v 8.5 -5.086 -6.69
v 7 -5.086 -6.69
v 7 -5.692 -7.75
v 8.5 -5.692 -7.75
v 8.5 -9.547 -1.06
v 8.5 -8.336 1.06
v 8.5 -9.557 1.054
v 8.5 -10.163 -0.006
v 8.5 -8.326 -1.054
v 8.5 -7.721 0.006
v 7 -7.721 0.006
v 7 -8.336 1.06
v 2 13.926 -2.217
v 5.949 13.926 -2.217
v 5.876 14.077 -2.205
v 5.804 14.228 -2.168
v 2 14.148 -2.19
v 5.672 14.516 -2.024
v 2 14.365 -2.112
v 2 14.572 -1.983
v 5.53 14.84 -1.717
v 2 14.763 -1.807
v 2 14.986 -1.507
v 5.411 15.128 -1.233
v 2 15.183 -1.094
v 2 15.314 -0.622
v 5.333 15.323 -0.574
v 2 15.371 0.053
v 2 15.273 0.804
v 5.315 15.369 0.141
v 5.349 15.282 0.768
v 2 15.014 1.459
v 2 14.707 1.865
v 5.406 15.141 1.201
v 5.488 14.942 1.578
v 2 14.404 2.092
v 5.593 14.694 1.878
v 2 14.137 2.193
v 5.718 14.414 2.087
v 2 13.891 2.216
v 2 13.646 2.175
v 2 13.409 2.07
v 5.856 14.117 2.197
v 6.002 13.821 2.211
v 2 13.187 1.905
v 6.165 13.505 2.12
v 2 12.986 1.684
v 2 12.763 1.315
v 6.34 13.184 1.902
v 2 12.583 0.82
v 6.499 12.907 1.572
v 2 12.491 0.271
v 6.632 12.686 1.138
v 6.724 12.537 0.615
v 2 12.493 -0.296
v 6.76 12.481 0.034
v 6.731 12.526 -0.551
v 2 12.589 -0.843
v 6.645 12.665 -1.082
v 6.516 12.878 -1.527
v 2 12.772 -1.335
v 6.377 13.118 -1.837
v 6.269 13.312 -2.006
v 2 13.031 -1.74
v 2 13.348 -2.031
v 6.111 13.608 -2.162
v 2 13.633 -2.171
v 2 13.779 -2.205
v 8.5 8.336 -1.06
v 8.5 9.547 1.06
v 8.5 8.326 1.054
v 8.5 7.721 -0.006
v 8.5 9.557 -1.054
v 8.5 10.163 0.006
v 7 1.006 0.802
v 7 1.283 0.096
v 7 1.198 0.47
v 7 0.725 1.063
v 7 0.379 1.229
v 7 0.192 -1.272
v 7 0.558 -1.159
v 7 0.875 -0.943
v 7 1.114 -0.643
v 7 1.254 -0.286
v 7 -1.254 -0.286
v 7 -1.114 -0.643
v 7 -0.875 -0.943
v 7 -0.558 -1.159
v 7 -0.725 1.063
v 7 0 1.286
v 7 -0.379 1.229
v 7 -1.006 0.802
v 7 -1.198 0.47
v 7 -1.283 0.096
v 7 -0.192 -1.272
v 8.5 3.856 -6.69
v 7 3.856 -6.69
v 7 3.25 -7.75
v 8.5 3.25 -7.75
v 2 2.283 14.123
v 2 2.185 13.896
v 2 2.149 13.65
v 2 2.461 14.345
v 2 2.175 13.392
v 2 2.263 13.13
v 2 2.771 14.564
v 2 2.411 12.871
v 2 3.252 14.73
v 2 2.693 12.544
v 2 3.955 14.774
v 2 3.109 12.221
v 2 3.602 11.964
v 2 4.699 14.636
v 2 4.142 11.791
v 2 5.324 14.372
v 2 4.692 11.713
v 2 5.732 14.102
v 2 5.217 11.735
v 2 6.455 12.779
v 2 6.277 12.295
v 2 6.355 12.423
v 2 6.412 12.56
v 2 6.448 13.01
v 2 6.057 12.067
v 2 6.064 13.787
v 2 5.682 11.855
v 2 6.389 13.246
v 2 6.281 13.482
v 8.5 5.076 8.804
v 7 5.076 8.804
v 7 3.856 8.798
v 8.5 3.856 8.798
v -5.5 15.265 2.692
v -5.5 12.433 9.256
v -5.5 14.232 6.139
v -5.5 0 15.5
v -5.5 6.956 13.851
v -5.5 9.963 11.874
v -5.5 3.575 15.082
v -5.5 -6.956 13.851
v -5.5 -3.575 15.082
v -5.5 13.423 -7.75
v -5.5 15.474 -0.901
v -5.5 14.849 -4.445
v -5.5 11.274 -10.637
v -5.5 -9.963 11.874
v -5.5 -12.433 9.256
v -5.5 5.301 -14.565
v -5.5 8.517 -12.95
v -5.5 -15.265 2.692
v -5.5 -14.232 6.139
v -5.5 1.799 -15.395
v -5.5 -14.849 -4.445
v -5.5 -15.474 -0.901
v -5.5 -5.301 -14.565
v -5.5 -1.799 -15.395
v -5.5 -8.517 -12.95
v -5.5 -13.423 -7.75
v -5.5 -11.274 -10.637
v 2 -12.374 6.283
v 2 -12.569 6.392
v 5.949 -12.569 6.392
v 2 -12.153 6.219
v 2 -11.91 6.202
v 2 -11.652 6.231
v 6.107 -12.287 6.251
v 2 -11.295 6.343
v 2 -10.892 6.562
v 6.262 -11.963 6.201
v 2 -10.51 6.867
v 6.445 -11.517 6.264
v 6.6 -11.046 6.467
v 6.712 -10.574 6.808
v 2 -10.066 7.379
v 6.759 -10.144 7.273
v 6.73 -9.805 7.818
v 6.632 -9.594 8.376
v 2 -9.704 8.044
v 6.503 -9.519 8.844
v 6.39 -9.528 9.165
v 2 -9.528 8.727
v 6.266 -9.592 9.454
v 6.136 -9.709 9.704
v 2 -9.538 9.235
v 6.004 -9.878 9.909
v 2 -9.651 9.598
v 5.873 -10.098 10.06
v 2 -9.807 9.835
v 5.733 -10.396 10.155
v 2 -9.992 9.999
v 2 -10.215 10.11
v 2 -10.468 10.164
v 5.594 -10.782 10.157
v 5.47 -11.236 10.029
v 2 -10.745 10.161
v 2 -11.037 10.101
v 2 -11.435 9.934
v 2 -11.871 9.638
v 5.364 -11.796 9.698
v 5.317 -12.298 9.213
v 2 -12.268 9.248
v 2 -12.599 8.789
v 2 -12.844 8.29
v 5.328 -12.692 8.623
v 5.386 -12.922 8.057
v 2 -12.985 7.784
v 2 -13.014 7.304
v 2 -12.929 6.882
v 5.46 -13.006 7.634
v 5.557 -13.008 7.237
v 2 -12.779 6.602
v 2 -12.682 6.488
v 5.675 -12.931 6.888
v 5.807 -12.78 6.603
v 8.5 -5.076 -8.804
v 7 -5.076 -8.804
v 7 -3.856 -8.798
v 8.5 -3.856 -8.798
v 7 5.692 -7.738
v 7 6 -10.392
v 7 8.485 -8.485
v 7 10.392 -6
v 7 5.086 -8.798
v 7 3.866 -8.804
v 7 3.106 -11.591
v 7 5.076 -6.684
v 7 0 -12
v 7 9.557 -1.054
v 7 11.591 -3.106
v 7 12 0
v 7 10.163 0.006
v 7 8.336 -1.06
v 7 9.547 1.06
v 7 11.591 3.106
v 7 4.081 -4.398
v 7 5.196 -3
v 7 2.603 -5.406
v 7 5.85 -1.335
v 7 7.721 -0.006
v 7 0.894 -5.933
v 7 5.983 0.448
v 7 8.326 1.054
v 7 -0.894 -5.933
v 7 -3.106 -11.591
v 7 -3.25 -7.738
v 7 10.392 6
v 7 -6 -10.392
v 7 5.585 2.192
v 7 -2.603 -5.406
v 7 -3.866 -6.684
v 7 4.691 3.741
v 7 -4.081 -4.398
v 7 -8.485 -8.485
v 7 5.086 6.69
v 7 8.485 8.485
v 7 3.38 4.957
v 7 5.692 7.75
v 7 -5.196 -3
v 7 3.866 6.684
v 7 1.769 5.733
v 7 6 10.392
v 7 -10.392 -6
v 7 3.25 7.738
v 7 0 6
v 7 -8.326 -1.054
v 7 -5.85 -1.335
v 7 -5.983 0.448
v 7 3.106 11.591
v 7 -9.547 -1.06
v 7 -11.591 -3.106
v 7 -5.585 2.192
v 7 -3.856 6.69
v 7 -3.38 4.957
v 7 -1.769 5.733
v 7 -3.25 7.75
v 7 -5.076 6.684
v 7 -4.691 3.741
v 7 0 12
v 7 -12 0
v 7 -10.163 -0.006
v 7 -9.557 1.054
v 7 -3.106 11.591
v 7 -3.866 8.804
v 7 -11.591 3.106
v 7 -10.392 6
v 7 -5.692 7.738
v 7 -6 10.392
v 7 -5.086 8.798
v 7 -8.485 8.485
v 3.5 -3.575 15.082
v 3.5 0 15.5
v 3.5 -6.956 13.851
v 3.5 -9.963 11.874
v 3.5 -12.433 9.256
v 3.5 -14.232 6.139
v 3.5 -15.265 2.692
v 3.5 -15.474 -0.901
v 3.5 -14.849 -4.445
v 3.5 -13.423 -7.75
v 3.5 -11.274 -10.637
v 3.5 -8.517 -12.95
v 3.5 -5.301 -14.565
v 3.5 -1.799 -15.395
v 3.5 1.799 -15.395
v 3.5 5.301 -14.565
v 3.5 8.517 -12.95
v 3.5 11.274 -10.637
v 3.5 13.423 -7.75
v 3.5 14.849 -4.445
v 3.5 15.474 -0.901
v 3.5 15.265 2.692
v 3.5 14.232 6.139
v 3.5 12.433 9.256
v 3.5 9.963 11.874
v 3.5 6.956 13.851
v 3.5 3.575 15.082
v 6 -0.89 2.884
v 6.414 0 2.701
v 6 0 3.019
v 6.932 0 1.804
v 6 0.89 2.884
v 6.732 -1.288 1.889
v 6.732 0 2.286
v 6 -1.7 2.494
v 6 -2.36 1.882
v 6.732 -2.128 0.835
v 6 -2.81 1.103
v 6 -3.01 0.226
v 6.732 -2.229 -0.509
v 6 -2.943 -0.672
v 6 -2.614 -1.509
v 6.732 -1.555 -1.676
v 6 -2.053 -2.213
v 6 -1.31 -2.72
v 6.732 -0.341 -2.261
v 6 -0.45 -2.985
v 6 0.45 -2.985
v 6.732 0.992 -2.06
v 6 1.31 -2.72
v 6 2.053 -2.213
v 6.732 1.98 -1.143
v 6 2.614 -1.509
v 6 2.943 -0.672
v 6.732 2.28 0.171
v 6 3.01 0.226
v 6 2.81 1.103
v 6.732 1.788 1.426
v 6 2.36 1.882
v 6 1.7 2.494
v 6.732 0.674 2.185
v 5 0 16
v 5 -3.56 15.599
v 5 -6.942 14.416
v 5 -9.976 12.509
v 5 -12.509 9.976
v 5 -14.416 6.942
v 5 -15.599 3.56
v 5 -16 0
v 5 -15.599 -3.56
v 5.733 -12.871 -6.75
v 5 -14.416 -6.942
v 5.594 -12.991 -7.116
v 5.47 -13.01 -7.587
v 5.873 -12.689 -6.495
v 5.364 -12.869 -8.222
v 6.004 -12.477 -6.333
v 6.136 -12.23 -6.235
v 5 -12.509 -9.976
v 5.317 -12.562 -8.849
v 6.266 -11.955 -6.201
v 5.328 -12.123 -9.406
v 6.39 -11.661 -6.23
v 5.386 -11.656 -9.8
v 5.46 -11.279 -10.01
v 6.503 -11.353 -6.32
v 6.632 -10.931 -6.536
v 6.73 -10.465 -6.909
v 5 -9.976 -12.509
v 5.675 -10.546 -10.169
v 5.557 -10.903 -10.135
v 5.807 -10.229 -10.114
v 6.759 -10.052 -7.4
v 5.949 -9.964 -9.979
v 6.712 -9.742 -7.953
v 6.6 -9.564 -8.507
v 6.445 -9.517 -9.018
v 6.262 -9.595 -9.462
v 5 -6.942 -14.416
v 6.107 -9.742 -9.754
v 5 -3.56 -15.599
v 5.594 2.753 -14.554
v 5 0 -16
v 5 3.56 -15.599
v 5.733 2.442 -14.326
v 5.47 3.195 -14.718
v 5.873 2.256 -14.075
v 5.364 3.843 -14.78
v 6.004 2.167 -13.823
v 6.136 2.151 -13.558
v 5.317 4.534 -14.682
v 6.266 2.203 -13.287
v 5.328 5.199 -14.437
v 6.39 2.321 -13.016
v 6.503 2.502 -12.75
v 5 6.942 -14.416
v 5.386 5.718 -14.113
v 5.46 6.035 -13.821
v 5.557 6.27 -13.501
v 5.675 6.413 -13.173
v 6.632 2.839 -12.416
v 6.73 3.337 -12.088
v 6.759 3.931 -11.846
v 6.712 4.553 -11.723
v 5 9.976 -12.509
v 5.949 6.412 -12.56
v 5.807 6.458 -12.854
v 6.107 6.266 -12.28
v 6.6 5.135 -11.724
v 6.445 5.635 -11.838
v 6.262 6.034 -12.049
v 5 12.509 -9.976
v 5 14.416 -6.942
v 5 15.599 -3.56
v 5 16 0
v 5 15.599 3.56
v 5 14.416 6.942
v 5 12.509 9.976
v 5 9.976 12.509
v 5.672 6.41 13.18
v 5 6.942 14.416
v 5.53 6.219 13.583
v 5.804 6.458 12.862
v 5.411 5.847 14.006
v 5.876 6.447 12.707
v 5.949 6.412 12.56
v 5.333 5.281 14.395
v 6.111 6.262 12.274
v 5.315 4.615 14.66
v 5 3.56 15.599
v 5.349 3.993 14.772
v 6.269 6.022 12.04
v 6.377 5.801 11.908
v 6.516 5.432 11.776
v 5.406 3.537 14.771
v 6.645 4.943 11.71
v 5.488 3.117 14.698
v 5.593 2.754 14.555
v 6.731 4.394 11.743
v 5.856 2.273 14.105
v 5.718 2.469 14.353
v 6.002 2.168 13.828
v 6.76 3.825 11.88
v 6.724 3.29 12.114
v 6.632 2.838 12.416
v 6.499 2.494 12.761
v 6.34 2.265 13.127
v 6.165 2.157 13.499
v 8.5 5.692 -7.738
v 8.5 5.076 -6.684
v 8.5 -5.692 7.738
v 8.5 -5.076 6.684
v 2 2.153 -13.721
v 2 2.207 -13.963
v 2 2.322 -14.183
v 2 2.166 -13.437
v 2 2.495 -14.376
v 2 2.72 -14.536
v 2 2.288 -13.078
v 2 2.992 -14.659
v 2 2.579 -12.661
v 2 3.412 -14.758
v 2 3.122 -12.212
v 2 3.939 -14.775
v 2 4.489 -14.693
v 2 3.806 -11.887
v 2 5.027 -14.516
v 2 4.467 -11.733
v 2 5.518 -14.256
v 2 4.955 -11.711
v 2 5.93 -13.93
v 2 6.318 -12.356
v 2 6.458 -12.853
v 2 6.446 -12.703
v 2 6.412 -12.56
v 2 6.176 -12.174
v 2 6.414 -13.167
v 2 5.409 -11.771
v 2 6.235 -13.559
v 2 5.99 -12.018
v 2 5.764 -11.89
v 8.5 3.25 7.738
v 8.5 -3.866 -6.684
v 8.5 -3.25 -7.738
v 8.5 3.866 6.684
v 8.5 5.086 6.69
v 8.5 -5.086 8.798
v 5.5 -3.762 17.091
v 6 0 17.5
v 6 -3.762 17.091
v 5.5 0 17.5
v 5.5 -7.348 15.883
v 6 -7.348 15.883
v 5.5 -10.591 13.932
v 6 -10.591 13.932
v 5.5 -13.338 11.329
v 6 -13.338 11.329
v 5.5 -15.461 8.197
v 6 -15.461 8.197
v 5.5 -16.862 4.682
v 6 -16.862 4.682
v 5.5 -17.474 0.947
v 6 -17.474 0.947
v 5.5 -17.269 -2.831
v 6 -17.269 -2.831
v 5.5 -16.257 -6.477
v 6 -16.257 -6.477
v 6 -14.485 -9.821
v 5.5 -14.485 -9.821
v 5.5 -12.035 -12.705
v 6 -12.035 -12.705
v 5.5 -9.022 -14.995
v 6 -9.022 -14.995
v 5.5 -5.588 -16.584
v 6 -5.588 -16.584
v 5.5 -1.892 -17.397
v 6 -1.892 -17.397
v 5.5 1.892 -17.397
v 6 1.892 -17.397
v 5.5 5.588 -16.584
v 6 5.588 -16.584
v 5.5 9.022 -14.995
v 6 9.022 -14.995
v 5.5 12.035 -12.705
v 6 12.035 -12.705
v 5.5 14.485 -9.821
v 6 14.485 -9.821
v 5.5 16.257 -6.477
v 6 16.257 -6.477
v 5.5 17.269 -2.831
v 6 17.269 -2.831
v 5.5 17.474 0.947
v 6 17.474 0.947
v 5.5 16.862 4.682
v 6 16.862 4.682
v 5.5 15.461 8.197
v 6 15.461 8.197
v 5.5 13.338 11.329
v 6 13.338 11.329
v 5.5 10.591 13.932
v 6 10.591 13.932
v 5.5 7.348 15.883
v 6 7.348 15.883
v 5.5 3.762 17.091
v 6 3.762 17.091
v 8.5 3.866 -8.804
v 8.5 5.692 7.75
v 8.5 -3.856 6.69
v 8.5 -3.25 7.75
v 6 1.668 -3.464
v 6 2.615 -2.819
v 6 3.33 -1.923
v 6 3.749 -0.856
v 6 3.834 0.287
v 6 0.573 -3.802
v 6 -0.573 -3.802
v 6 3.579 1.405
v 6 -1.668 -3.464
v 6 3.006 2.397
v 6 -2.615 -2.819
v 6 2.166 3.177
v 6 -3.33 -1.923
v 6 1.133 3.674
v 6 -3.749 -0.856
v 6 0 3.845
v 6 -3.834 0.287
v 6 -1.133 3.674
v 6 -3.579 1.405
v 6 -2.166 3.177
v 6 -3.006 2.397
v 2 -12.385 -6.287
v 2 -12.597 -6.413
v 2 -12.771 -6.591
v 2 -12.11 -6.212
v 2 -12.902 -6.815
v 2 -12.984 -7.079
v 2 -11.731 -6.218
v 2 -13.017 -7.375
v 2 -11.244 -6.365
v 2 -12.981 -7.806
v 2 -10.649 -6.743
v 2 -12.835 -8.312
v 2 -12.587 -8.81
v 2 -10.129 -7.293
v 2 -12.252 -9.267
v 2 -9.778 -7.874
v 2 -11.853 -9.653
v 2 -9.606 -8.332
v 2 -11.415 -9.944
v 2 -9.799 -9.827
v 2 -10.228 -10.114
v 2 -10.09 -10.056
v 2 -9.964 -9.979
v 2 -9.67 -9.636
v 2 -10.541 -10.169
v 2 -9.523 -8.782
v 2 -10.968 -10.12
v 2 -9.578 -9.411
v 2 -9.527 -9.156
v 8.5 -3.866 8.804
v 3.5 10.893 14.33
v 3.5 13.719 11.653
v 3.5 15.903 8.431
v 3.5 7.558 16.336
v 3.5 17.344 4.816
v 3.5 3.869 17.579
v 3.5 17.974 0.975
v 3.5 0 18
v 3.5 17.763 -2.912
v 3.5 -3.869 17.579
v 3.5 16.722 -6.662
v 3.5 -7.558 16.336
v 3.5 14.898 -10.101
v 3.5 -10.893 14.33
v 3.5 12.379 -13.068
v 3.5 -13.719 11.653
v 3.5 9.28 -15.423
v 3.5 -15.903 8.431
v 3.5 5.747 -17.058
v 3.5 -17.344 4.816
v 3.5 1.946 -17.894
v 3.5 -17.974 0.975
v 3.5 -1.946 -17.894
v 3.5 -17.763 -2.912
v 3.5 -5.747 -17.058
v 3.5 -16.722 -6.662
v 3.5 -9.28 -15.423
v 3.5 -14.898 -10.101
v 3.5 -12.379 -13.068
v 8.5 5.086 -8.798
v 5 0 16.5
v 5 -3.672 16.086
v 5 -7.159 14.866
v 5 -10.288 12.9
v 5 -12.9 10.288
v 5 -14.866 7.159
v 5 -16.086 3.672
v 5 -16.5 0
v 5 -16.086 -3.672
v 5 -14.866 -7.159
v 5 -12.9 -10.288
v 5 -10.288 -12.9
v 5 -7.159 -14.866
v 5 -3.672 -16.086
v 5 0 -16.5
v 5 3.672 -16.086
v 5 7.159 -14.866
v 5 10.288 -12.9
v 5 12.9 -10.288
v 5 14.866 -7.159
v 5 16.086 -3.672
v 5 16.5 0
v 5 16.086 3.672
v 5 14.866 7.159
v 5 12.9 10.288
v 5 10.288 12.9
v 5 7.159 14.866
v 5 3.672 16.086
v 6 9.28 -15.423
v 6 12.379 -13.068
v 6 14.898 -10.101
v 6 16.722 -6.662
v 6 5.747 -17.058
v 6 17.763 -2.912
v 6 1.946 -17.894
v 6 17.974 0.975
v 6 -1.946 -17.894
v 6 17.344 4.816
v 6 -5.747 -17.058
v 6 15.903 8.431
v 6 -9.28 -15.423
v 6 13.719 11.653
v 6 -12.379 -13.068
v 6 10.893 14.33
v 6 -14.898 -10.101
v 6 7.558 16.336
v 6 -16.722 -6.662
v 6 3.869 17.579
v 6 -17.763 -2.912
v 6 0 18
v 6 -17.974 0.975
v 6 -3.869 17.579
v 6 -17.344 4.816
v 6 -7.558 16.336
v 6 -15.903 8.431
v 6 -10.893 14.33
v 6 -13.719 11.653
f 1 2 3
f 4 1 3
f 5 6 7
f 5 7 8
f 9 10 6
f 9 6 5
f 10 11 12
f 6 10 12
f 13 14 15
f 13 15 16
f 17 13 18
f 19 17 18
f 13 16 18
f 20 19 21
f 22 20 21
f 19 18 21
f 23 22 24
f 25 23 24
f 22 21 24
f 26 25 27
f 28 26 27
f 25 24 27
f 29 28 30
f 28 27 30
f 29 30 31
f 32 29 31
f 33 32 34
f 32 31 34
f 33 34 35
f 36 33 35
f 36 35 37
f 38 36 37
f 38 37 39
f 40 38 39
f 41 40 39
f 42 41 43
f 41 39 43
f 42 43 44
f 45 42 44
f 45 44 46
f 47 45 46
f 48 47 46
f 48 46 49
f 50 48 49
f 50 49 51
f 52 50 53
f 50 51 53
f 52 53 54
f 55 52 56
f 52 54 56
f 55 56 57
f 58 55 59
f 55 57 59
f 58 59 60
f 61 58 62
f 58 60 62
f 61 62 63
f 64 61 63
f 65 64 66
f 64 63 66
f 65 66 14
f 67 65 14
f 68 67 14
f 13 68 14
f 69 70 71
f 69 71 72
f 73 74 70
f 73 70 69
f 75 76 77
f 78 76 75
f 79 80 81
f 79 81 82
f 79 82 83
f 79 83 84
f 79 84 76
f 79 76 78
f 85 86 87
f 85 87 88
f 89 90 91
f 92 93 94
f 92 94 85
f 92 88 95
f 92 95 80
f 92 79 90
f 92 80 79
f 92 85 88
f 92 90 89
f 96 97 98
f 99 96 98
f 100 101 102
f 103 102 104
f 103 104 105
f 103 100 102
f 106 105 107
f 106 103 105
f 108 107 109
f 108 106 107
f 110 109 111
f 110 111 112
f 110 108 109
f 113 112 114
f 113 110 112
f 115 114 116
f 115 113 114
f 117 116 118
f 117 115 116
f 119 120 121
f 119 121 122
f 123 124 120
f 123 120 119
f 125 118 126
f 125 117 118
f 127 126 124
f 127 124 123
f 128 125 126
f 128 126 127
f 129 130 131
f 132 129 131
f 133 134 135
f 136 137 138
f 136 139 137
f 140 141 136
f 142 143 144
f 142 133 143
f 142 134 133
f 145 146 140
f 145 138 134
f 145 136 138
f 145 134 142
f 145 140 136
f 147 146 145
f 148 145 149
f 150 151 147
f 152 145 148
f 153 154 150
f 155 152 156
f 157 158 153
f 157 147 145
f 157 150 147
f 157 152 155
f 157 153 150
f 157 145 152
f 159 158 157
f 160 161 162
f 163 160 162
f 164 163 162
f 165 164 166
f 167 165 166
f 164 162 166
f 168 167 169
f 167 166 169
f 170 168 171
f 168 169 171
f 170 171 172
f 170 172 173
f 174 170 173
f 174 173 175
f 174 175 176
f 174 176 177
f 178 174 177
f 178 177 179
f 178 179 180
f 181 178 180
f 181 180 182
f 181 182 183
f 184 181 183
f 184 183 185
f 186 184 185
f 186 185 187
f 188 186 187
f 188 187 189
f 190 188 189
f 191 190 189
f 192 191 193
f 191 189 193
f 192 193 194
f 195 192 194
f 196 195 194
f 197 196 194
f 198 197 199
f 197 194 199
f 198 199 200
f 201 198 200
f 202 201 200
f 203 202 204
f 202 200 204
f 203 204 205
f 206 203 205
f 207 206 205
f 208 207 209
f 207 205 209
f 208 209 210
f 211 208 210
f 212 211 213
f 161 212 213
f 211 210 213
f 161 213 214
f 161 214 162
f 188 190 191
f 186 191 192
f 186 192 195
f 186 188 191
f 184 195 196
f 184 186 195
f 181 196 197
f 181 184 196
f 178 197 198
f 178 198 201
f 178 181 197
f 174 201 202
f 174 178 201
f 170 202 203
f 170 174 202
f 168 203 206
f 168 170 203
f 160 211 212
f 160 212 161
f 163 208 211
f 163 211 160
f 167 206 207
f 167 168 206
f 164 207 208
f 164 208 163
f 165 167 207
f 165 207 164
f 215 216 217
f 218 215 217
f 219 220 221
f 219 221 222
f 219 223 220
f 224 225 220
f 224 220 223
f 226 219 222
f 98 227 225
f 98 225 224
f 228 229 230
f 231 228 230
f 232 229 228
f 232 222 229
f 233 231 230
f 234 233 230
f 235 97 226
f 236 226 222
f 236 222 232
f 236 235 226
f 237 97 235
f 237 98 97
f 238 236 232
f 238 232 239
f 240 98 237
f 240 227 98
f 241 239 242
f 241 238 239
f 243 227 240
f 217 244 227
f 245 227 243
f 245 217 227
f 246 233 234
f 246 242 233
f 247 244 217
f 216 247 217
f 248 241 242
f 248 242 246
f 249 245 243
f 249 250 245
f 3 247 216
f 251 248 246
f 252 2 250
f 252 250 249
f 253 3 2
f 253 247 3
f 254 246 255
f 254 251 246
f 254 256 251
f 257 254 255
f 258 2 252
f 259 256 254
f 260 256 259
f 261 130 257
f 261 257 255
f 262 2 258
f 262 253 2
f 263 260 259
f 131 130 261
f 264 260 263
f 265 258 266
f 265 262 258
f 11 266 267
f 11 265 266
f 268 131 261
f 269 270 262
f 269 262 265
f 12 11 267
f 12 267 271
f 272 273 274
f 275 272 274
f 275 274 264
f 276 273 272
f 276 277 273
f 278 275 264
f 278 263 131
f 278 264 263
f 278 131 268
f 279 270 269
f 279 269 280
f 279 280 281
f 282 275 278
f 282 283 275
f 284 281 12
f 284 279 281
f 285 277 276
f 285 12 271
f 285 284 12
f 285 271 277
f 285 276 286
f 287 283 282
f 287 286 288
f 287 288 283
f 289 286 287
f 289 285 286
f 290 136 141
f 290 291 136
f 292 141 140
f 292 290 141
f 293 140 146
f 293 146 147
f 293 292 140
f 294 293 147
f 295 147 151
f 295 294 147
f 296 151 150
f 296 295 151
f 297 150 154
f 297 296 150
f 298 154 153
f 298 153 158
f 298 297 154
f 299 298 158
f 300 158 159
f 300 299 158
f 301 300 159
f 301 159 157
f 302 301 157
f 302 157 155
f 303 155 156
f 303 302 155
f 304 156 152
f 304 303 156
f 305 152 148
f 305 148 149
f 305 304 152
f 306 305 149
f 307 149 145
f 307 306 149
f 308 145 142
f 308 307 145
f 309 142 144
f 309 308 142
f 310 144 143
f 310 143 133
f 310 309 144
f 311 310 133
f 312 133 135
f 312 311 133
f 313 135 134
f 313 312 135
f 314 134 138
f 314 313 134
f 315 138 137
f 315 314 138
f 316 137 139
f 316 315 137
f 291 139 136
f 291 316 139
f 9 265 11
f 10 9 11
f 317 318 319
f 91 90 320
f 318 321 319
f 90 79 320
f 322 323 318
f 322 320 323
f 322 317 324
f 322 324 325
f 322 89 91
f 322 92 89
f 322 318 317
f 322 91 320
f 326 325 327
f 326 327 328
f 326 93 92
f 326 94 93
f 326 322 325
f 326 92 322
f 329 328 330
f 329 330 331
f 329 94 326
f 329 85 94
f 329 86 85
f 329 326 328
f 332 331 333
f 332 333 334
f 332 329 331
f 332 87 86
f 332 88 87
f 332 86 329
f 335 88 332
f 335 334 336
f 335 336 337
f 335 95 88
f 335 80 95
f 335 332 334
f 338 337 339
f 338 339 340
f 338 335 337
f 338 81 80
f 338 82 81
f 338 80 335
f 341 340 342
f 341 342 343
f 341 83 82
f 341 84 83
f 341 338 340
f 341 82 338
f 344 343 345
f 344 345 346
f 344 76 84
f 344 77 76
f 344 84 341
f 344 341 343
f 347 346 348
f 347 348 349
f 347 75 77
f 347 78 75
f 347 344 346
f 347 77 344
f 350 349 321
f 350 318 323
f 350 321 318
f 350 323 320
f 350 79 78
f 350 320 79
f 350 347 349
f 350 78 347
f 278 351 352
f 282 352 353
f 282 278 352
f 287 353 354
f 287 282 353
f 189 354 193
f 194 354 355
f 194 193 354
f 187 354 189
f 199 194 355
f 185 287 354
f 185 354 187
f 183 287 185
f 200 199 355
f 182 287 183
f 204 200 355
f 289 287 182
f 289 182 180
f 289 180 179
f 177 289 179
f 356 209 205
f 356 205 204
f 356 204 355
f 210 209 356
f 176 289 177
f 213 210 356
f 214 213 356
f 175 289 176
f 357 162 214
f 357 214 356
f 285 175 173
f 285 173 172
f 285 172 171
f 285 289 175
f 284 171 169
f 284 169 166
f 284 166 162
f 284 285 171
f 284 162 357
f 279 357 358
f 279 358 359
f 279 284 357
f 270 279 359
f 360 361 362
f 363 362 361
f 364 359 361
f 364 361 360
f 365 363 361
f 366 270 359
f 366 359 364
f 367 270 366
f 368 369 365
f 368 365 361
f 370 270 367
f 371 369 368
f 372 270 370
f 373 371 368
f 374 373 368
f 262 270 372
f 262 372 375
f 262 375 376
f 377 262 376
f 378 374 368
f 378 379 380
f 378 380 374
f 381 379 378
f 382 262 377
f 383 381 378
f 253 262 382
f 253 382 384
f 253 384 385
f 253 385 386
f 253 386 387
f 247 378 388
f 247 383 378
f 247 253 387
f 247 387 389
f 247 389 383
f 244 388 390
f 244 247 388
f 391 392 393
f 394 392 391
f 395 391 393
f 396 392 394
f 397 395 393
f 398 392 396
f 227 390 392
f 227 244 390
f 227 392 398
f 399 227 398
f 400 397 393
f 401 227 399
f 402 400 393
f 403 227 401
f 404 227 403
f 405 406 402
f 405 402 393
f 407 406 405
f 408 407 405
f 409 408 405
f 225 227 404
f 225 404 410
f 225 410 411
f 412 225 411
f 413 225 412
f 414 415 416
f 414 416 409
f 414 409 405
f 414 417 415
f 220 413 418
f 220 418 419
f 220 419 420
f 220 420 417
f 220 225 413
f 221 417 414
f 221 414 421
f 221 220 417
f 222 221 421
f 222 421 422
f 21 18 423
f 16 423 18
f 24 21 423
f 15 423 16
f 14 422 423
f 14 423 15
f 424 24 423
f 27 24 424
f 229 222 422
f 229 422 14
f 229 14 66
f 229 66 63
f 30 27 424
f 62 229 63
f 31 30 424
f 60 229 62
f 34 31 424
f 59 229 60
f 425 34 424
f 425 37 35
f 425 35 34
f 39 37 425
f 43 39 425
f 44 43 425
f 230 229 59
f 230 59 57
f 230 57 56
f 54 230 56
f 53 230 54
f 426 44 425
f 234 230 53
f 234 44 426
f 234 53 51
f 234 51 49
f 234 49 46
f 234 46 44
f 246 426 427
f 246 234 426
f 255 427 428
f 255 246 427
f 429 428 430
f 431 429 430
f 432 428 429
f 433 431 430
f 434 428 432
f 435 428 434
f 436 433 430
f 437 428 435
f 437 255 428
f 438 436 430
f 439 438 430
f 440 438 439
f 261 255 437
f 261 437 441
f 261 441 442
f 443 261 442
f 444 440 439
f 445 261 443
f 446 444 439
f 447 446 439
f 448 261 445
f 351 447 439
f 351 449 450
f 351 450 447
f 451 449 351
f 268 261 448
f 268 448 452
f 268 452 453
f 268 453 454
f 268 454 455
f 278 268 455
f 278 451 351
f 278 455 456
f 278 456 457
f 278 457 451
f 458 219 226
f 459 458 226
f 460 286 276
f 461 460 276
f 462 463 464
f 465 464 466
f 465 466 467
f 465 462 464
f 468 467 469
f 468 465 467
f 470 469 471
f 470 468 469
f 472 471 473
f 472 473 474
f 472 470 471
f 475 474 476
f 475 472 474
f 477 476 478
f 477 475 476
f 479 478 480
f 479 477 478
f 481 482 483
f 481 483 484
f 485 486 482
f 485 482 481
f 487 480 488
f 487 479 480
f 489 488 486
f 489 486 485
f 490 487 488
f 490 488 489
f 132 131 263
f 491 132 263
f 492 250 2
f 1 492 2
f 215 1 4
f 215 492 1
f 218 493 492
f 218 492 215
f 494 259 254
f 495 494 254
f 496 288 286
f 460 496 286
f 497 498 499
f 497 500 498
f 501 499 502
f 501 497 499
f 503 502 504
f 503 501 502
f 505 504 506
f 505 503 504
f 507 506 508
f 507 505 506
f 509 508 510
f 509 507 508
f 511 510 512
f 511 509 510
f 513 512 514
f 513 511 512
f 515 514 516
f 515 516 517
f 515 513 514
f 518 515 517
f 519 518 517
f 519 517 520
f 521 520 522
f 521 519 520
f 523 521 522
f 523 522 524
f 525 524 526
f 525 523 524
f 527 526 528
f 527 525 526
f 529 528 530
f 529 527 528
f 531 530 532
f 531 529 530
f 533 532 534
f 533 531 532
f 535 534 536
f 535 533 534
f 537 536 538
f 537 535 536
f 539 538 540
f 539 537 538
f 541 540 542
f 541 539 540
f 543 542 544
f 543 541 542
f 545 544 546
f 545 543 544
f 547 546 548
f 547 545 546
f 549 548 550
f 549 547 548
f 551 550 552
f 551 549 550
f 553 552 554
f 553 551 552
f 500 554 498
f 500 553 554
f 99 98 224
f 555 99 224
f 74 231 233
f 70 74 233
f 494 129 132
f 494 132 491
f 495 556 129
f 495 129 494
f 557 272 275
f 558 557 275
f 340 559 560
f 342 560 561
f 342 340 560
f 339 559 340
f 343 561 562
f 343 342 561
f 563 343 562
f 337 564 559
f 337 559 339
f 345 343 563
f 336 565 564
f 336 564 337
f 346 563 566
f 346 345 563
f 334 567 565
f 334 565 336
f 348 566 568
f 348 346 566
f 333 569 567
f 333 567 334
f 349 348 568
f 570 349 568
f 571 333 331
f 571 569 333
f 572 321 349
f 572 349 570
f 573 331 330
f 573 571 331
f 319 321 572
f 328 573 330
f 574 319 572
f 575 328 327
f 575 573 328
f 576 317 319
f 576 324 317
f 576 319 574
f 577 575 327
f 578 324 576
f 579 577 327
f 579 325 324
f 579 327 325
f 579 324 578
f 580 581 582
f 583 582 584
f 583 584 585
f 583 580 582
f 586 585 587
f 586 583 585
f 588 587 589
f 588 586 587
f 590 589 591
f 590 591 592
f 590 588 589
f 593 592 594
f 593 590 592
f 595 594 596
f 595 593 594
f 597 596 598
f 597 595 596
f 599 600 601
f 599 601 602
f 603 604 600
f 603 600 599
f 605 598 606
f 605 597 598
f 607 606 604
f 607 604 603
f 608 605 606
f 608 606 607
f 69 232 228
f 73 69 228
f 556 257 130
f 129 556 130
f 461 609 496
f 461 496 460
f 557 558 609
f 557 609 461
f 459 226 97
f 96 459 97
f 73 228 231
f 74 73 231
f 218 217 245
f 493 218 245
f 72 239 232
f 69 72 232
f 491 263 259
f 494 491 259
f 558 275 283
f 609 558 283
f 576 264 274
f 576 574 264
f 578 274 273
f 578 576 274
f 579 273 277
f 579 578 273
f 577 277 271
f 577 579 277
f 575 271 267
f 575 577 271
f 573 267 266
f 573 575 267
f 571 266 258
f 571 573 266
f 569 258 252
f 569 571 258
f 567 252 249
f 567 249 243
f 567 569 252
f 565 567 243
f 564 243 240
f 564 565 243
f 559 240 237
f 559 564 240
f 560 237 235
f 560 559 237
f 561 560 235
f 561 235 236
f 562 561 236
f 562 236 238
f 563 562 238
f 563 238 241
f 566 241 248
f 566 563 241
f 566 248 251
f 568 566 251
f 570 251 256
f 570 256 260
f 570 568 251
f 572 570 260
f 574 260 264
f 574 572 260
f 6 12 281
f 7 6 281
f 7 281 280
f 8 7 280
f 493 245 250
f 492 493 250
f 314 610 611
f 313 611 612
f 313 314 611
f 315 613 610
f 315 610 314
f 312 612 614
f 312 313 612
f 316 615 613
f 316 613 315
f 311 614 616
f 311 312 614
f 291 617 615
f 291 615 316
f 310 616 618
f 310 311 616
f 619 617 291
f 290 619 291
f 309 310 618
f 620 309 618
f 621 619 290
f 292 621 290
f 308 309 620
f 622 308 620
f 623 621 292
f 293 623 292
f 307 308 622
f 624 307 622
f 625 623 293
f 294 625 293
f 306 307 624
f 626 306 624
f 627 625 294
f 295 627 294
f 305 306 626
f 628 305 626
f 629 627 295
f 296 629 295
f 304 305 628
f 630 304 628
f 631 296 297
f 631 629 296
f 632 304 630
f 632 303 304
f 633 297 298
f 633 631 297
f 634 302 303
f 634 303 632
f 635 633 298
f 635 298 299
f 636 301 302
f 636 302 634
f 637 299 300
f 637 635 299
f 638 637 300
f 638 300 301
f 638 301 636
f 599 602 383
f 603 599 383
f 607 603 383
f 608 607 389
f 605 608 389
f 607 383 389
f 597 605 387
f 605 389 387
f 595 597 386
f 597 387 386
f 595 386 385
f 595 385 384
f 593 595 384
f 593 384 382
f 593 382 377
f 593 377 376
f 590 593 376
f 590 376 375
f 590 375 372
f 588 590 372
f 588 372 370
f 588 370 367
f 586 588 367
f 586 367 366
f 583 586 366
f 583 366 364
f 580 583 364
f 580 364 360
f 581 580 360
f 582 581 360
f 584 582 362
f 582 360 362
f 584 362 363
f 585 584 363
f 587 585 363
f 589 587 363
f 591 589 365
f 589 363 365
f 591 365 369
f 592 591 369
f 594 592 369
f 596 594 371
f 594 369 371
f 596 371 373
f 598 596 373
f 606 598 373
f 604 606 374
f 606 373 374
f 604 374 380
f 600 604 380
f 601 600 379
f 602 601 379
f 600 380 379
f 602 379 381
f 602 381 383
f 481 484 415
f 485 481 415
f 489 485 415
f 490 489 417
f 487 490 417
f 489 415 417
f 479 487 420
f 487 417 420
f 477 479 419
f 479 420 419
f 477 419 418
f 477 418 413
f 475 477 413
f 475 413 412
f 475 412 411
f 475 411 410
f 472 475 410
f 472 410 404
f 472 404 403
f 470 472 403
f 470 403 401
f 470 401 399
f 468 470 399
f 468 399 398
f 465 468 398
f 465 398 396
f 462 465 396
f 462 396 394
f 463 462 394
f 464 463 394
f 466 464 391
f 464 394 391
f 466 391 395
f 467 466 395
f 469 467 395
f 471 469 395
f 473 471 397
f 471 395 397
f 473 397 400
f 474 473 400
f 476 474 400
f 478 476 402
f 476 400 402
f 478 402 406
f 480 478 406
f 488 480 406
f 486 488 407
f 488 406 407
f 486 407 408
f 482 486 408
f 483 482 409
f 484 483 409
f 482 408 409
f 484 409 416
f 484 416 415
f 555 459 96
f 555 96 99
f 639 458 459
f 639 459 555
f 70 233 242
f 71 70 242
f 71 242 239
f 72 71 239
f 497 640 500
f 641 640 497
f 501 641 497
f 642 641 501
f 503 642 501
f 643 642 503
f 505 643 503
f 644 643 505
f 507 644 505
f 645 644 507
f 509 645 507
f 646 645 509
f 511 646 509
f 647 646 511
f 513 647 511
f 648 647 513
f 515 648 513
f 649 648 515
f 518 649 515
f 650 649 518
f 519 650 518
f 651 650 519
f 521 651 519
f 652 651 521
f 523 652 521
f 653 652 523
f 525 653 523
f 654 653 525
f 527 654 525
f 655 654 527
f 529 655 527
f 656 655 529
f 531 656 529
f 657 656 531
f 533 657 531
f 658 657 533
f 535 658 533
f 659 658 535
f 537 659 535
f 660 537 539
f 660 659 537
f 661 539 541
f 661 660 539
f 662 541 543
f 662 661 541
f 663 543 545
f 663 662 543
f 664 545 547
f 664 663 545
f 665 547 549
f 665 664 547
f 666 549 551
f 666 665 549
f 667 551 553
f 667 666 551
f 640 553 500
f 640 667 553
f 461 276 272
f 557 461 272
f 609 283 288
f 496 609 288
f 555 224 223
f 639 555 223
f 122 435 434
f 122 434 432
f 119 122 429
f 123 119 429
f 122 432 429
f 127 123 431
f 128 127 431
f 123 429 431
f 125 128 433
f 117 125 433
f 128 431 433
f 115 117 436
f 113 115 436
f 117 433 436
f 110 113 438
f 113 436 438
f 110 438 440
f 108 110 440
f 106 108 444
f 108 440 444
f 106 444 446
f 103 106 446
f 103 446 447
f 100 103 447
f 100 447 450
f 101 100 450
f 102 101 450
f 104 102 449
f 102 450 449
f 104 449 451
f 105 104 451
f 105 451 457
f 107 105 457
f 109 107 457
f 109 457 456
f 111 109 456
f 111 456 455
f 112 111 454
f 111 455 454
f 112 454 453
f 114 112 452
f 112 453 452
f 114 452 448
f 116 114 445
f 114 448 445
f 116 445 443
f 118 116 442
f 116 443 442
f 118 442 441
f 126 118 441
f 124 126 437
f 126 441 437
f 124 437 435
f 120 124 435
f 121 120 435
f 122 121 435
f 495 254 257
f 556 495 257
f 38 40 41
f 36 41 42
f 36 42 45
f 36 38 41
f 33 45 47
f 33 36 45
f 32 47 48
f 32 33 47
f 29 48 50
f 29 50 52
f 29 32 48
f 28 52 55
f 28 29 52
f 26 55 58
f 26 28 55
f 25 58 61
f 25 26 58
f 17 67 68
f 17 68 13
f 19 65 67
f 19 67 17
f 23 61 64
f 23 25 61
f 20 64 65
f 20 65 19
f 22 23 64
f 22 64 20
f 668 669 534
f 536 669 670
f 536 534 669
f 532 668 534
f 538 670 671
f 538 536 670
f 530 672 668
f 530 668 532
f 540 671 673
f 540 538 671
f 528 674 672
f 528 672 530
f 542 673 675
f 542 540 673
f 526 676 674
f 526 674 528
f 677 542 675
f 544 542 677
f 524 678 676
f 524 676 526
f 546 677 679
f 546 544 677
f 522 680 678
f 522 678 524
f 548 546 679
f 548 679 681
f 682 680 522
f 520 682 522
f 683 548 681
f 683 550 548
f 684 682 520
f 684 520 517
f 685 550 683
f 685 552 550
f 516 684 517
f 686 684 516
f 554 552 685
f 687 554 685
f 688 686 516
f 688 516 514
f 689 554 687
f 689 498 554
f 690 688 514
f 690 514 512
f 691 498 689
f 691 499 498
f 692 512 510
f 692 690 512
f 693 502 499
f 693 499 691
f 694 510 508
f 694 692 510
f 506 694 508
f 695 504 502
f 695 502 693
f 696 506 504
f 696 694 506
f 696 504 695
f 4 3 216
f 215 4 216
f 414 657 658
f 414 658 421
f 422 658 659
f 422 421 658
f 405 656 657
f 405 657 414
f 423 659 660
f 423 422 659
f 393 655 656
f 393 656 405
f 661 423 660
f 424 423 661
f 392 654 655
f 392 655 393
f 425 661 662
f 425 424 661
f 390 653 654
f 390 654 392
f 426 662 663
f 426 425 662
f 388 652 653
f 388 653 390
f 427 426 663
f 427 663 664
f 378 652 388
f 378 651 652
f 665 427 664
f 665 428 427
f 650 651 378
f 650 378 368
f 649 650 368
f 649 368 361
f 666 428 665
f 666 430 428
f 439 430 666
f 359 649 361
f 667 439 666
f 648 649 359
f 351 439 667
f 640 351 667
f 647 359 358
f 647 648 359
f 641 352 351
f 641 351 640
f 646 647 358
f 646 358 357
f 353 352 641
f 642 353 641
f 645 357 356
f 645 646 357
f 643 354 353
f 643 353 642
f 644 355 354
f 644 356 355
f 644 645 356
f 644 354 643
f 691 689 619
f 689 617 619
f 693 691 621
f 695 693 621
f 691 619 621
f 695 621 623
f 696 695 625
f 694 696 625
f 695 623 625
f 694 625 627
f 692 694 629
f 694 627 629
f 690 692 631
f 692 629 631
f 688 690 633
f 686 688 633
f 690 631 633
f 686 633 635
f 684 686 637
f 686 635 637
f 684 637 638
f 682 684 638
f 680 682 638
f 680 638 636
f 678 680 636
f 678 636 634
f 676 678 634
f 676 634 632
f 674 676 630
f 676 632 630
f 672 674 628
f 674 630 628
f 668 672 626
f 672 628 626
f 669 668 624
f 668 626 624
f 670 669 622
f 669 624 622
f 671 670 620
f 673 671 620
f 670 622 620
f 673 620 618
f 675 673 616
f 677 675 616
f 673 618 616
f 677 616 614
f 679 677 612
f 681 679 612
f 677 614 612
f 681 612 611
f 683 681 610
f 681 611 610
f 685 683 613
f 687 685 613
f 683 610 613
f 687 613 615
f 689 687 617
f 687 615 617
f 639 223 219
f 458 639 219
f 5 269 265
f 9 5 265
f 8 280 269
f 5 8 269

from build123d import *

# Parameters (mm, degrees)
SKETCH3_RX          = 2.216625444
SKETCH3_RY          = 1.445625289
CUT_EXTRUDE1_DEPTH  = 5
FILLET1_R           = 2
BOSS_EXTRUDE1_DEPTH = 1.5


with BuildPart() as part:
    # Sketch1 → Revolve1 (revolve)
    with BuildSketch(Plane(origin=(0, 0, 0), x_dir=(1, 0, 0), z_dir=(0, 1, 0)), mode=Mode.PRIVATE) as revolve1_sk:
        Polygon((5.5, 0), (-5.5, 0), (-5.5, 15.5), (3.5, 15.5), (3.5, 18), (5.5, 18), (6, 18), (6, 17.5), (5.5, 17.5), (5, 16.5), (5, 16), (7, 12), (7, 6), (6, 3.845161331), (6, 3.018549032), (7, 2.554477167), (7, 0), align=None)
    revolve(revolve1_sk.sketch.rotate(Axis((-25, 0, 0), (1, 0, 0)), 180), axis=Axis((-25, 0, 0), (1, 0, 0)))

    # Sketch3 → Cut-Extrude1 (cut, symmetric)
    with BuildSketch(Plane(origin=(7, 0, 0), x_dir=(0, 0, -1), z_dir=(1, 0, 0))):
        with Locations(Location((0, 13.926190288), (0, 0, 0))):
            Ellipse(SKETCH3_RX, SKETCH3_RY)
        with Locations(Location((13.244594021, 4.303429466), (0, 0, 108))):
            Ellipse(SKETCH3_RX, SKETCH3_RY)
        with Locations(Location((8.185609272, -11.26652461), (0, 0, 36))):
            Ellipse(SKETCH3_RX, SKETCH3_RY)
        with Locations(Location((-8.185609272, -11.26652461), (0, 0, -36))):
            Ellipse(SKETCH3_RX, SKETCH3_RY)
        with Locations(Location((-13.244594021, 4.303429466), (0, 0, 72))):
            Ellipse(SKETCH3_RX, SKETCH3_RY)
    extrude(amount=CUT_EXTRUDE1_DEPTH, both=True, mode=Mode.SUBTRACT)

    # Fillet1
    # the kernel refuses this fillet: 2 mm, written as the material it takes off along each edge
    with BuildSketch(Plane(origin=(7, 0, 0), x_dir=(0, 0, 1), z_dir=(0, 1, 0))) as fillet1_piece_1:
        with BuildLine():
            CenterArc((1.286498225, -2), FILLET1_R, 30, 60)
            Line((1.286498225, 0), (1.286498225, 0.04))
            Line((1.286498225, 0.04), (2.554477167, 0.04))
            Line((2.554477167, 0.04), (2.590760489, 0.016838069))
            ThreePointArc((2.590760489, 0.016838069), (2.822796422, -0.483161931), (3.053190048, -0.98))
            Line((3.053190048, -0.98), (3.018549032, -1))
        make_face()
    revolve(axis=Axis((7, 0, 0), (1, 0, 0)), mode=Mode.SUBTRACT)

    # Sketch4 → Boss-Extrude1 (add)
    with BuildSketch(Plane(origin=(7, 0, 0), x_dir=(0, 0, -1), z_dir=(1, 0, 0))):
        Polygon((7.749630704, 3.250124219), (8.80400944, 3.865505525), (8.798262965, 5.086314949), (7.738137753, 5.691743068), (6.683759016, 5.076361762), (6.689505491, 3.855552338), align=None)
        Polygon((1.060125212, 8.336439169), (1.054378737, 9.557248593), (-0.005746475, 10.162676712), (-1.060125212, 9.547295406), (-1.054378737, 8.326485982), (0.005746475, 7.721057863), align=None)
        Polygon((6.689505491, -5.086314949), (7.749630704, -5.691743068), (8.80400944, -5.076361762), (8.798262965, -3.855552338), (7.738137753, -3.250124219), (6.683759016, -3.865505525), align=None)
        Polygon((-1.060125212, -8.336439169), (-1.054378737, -9.557248593), (0.005746475, -10.162676712), (1.060125212, -9.547295406), (1.054378737, -8.326485982), (-0.005746475, -7.721057863), align=None)
        Polygon((-7.749630704, -3.250124219), (-8.80400944, -3.865505525), (-8.798262965, -5.086314949), (-7.738137753, -5.691743068), (-6.683759016, -5.076361762), (-6.689505491, -3.855552338), align=None)
        Polygon((-6.689505491, 5.086314949), (-7.749630704, 5.691743068), (-8.80400944, 5.076361762), (-8.798262965, 3.855552338), (-7.738137753, 3.250124219), (-6.683759016, 3.865505525), align=None)
    extrude(amount=BOSS_EXTRUDE1_DEPTH)


solid = part.part
